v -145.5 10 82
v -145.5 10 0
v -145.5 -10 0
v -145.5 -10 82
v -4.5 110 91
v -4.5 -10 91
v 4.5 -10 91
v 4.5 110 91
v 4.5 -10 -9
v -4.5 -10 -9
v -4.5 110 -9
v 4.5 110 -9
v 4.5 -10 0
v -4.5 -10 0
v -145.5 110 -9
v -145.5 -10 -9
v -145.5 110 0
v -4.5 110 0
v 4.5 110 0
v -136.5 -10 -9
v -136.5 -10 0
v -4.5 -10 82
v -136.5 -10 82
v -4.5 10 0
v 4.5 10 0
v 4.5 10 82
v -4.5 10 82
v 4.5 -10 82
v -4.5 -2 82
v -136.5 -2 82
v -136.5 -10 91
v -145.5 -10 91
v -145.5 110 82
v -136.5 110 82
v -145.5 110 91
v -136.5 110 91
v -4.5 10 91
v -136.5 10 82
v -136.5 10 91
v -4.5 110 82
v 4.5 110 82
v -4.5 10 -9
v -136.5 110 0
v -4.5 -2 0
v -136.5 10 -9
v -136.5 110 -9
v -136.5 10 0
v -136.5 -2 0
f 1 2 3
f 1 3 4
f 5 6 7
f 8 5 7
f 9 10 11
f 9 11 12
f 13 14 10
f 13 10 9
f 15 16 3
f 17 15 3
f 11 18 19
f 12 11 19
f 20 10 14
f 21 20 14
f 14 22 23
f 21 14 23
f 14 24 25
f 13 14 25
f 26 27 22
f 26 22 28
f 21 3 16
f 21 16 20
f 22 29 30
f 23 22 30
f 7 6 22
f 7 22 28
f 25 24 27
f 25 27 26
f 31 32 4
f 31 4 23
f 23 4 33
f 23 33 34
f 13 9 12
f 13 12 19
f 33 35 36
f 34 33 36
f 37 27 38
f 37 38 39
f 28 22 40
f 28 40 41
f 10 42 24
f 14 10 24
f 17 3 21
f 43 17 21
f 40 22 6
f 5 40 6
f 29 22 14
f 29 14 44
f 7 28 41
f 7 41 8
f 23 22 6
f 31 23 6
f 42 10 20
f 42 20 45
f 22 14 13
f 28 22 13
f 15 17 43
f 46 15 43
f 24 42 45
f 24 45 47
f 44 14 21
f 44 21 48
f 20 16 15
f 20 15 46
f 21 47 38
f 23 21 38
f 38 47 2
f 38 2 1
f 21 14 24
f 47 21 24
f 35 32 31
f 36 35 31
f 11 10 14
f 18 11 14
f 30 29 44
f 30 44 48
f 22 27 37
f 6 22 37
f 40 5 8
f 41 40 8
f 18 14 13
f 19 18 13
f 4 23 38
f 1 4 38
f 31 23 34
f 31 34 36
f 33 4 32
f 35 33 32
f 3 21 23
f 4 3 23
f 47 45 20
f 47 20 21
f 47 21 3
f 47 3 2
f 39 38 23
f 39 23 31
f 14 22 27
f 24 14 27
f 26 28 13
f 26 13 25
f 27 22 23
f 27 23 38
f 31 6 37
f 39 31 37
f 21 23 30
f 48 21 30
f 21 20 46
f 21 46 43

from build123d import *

# Parameters (mm, degrees)
SKETCH3_W              = 9
SKETCH3_H              = 20
BOSS_EXTRUDE2_DEPTH    = 82
SKETCH7_W              = 9
SKETCH7_H              = 20
BOSS_EXTRUDE7_DEPTH    = 132
SKETCH8_W              = 82
SKETCH8_H              = 20
BOSS_EXTRUDE8_DEPTH    = 9
SKETCH9_W              = 9
SKETCH9_H              = 20
BOSS_EXTRUDE9_DEPTH    = 132
BOSS_EXTRUDE13_REACH   = 173.905
SKETCH11_W             = 132
SKETCH11_H             = 8
SKETCH12_W             = 9
SKETCH12_H             = 9
BOSS_EXTRUDE14_DEPTH   = 120
BOSS_EXTRUDE14_2_DEPTH = 120
BOSS_EXTRUDE14_3_DEPTH = 120
BOSS_EXTRUDE14_4_DEPTH = 120


with BuildPart() as part:
    # Sketch3 → Boss-Extrude2 (new body)
    with BuildSketch(Plane.XY):
        Rectangle(SKETCH3_W, SKETCH3_H)
    extrude(amount=BOSS_EXTRUDE2_DEPTH)


with BuildPart() as body_2:
    # Sketch7 → Boss-Extrude7 (new body)
    with BuildSketch(Plane.ZY.offset(4.5)):
        with Locations((86.5, 0)):
            Rectangle(SKETCH7_W, SKETCH7_H)
    extrude(amount=BOSS_EXTRUDE7_DEPTH)


with BuildPart() as body_3:
    # Sketch8 → Boss-Extrude8 (new body)
    with BuildSketch(Plane.ZY.offset(136.5)):
        with Locations((41, 0)):
            Rectangle(SKETCH8_W, SKETCH8_H)
    extrude(amount=BOSS_EXTRUDE8_DEPTH)


with BuildPart() as body_4:
    # Sketch9 → Boss-Extrude9 (new body)
    with BuildSketch(Plane.ZY.offset(4.5)):
        with Locations((-4.5, 0)):
            Rectangle(SKETCH9_W, SKETCH9_H)
    extrude(amount=BOSS_EXTRUDE9_DEPTH)


with BuildPart() as body_5:

    # Sketch11 → Boss-Extrude13 (new, up to next)
    with BuildSketch(Plane(origin=(0, 0, 82), x_dir=(-1, 0, 0), z_dir=(0, 0, -1)), mode=Mode.PRIVATE) as boss_extrude13_sk1:
        with Locations((70.5, -6)):
            Rectangle(SKETCH11_W, SKETCH11_H)
    boss_extrude13_tool1 = extrude(boss_extrude13_sk1.sketch, amount=BOSS_EXTRUDE13_REACH, mode=Mode.PRIVATE) - body_4.part
    add(boss_extrude13_tool1.solids().sort_by_distance((-70.5, -6, 82))[0])


with BuildPart() as body_6:
    # Sketch12 → Boss-Extrude14 (new body)
    with BuildSketch(Plane.XZ.offset(10)):
        with Locations((-141, 86.5)):
            Rectangle(SKETCH12_W, SKETCH12_H)
    extrude(amount=-BOSS_EXTRUDE14_DEPTH)


with BuildPart() as body_7:
    # Sketch12 → Boss-Extrude14 2 (new body)
    with BuildSketch(Plane.XZ.offset(10)):
        with Locations((0, 86.5)):
            Rectangle(SKETCH12_W, SKETCH12_H)
    extrude(amount=-BOSS_EXTRUDE14_2_DEPTH)


with BuildPart() as body_8:
    # Sketch12 → Boss-Extrude14 3 (new body)
    with BuildSketch(Plane.XZ.offset(10)):
        with Locations((0, -4.5)):
            Rectangle(SKETCH12_W, SKETCH12_H)
    extrude(amount=-BOSS_EXTRUDE14_3_DEPTH)


with BuildPart() as body_9:
    # Sketch12 → Boss-Extrude14 4 (new body)
    with BuildSketch(Plane.XZ.offset(10)):
        with Locations((-141, -4.5)):
            Rectangle(SKETCH12_W, SKETCH12_H)
    extrude(amount=-BOSS_EXTRUDE14_4_DEPTH)


solid = Compound([part.part, body_2.part, body_3.part, body_4.part, body_5.part, body_6.part, body_7.part, body_8.part, body_9.part])
